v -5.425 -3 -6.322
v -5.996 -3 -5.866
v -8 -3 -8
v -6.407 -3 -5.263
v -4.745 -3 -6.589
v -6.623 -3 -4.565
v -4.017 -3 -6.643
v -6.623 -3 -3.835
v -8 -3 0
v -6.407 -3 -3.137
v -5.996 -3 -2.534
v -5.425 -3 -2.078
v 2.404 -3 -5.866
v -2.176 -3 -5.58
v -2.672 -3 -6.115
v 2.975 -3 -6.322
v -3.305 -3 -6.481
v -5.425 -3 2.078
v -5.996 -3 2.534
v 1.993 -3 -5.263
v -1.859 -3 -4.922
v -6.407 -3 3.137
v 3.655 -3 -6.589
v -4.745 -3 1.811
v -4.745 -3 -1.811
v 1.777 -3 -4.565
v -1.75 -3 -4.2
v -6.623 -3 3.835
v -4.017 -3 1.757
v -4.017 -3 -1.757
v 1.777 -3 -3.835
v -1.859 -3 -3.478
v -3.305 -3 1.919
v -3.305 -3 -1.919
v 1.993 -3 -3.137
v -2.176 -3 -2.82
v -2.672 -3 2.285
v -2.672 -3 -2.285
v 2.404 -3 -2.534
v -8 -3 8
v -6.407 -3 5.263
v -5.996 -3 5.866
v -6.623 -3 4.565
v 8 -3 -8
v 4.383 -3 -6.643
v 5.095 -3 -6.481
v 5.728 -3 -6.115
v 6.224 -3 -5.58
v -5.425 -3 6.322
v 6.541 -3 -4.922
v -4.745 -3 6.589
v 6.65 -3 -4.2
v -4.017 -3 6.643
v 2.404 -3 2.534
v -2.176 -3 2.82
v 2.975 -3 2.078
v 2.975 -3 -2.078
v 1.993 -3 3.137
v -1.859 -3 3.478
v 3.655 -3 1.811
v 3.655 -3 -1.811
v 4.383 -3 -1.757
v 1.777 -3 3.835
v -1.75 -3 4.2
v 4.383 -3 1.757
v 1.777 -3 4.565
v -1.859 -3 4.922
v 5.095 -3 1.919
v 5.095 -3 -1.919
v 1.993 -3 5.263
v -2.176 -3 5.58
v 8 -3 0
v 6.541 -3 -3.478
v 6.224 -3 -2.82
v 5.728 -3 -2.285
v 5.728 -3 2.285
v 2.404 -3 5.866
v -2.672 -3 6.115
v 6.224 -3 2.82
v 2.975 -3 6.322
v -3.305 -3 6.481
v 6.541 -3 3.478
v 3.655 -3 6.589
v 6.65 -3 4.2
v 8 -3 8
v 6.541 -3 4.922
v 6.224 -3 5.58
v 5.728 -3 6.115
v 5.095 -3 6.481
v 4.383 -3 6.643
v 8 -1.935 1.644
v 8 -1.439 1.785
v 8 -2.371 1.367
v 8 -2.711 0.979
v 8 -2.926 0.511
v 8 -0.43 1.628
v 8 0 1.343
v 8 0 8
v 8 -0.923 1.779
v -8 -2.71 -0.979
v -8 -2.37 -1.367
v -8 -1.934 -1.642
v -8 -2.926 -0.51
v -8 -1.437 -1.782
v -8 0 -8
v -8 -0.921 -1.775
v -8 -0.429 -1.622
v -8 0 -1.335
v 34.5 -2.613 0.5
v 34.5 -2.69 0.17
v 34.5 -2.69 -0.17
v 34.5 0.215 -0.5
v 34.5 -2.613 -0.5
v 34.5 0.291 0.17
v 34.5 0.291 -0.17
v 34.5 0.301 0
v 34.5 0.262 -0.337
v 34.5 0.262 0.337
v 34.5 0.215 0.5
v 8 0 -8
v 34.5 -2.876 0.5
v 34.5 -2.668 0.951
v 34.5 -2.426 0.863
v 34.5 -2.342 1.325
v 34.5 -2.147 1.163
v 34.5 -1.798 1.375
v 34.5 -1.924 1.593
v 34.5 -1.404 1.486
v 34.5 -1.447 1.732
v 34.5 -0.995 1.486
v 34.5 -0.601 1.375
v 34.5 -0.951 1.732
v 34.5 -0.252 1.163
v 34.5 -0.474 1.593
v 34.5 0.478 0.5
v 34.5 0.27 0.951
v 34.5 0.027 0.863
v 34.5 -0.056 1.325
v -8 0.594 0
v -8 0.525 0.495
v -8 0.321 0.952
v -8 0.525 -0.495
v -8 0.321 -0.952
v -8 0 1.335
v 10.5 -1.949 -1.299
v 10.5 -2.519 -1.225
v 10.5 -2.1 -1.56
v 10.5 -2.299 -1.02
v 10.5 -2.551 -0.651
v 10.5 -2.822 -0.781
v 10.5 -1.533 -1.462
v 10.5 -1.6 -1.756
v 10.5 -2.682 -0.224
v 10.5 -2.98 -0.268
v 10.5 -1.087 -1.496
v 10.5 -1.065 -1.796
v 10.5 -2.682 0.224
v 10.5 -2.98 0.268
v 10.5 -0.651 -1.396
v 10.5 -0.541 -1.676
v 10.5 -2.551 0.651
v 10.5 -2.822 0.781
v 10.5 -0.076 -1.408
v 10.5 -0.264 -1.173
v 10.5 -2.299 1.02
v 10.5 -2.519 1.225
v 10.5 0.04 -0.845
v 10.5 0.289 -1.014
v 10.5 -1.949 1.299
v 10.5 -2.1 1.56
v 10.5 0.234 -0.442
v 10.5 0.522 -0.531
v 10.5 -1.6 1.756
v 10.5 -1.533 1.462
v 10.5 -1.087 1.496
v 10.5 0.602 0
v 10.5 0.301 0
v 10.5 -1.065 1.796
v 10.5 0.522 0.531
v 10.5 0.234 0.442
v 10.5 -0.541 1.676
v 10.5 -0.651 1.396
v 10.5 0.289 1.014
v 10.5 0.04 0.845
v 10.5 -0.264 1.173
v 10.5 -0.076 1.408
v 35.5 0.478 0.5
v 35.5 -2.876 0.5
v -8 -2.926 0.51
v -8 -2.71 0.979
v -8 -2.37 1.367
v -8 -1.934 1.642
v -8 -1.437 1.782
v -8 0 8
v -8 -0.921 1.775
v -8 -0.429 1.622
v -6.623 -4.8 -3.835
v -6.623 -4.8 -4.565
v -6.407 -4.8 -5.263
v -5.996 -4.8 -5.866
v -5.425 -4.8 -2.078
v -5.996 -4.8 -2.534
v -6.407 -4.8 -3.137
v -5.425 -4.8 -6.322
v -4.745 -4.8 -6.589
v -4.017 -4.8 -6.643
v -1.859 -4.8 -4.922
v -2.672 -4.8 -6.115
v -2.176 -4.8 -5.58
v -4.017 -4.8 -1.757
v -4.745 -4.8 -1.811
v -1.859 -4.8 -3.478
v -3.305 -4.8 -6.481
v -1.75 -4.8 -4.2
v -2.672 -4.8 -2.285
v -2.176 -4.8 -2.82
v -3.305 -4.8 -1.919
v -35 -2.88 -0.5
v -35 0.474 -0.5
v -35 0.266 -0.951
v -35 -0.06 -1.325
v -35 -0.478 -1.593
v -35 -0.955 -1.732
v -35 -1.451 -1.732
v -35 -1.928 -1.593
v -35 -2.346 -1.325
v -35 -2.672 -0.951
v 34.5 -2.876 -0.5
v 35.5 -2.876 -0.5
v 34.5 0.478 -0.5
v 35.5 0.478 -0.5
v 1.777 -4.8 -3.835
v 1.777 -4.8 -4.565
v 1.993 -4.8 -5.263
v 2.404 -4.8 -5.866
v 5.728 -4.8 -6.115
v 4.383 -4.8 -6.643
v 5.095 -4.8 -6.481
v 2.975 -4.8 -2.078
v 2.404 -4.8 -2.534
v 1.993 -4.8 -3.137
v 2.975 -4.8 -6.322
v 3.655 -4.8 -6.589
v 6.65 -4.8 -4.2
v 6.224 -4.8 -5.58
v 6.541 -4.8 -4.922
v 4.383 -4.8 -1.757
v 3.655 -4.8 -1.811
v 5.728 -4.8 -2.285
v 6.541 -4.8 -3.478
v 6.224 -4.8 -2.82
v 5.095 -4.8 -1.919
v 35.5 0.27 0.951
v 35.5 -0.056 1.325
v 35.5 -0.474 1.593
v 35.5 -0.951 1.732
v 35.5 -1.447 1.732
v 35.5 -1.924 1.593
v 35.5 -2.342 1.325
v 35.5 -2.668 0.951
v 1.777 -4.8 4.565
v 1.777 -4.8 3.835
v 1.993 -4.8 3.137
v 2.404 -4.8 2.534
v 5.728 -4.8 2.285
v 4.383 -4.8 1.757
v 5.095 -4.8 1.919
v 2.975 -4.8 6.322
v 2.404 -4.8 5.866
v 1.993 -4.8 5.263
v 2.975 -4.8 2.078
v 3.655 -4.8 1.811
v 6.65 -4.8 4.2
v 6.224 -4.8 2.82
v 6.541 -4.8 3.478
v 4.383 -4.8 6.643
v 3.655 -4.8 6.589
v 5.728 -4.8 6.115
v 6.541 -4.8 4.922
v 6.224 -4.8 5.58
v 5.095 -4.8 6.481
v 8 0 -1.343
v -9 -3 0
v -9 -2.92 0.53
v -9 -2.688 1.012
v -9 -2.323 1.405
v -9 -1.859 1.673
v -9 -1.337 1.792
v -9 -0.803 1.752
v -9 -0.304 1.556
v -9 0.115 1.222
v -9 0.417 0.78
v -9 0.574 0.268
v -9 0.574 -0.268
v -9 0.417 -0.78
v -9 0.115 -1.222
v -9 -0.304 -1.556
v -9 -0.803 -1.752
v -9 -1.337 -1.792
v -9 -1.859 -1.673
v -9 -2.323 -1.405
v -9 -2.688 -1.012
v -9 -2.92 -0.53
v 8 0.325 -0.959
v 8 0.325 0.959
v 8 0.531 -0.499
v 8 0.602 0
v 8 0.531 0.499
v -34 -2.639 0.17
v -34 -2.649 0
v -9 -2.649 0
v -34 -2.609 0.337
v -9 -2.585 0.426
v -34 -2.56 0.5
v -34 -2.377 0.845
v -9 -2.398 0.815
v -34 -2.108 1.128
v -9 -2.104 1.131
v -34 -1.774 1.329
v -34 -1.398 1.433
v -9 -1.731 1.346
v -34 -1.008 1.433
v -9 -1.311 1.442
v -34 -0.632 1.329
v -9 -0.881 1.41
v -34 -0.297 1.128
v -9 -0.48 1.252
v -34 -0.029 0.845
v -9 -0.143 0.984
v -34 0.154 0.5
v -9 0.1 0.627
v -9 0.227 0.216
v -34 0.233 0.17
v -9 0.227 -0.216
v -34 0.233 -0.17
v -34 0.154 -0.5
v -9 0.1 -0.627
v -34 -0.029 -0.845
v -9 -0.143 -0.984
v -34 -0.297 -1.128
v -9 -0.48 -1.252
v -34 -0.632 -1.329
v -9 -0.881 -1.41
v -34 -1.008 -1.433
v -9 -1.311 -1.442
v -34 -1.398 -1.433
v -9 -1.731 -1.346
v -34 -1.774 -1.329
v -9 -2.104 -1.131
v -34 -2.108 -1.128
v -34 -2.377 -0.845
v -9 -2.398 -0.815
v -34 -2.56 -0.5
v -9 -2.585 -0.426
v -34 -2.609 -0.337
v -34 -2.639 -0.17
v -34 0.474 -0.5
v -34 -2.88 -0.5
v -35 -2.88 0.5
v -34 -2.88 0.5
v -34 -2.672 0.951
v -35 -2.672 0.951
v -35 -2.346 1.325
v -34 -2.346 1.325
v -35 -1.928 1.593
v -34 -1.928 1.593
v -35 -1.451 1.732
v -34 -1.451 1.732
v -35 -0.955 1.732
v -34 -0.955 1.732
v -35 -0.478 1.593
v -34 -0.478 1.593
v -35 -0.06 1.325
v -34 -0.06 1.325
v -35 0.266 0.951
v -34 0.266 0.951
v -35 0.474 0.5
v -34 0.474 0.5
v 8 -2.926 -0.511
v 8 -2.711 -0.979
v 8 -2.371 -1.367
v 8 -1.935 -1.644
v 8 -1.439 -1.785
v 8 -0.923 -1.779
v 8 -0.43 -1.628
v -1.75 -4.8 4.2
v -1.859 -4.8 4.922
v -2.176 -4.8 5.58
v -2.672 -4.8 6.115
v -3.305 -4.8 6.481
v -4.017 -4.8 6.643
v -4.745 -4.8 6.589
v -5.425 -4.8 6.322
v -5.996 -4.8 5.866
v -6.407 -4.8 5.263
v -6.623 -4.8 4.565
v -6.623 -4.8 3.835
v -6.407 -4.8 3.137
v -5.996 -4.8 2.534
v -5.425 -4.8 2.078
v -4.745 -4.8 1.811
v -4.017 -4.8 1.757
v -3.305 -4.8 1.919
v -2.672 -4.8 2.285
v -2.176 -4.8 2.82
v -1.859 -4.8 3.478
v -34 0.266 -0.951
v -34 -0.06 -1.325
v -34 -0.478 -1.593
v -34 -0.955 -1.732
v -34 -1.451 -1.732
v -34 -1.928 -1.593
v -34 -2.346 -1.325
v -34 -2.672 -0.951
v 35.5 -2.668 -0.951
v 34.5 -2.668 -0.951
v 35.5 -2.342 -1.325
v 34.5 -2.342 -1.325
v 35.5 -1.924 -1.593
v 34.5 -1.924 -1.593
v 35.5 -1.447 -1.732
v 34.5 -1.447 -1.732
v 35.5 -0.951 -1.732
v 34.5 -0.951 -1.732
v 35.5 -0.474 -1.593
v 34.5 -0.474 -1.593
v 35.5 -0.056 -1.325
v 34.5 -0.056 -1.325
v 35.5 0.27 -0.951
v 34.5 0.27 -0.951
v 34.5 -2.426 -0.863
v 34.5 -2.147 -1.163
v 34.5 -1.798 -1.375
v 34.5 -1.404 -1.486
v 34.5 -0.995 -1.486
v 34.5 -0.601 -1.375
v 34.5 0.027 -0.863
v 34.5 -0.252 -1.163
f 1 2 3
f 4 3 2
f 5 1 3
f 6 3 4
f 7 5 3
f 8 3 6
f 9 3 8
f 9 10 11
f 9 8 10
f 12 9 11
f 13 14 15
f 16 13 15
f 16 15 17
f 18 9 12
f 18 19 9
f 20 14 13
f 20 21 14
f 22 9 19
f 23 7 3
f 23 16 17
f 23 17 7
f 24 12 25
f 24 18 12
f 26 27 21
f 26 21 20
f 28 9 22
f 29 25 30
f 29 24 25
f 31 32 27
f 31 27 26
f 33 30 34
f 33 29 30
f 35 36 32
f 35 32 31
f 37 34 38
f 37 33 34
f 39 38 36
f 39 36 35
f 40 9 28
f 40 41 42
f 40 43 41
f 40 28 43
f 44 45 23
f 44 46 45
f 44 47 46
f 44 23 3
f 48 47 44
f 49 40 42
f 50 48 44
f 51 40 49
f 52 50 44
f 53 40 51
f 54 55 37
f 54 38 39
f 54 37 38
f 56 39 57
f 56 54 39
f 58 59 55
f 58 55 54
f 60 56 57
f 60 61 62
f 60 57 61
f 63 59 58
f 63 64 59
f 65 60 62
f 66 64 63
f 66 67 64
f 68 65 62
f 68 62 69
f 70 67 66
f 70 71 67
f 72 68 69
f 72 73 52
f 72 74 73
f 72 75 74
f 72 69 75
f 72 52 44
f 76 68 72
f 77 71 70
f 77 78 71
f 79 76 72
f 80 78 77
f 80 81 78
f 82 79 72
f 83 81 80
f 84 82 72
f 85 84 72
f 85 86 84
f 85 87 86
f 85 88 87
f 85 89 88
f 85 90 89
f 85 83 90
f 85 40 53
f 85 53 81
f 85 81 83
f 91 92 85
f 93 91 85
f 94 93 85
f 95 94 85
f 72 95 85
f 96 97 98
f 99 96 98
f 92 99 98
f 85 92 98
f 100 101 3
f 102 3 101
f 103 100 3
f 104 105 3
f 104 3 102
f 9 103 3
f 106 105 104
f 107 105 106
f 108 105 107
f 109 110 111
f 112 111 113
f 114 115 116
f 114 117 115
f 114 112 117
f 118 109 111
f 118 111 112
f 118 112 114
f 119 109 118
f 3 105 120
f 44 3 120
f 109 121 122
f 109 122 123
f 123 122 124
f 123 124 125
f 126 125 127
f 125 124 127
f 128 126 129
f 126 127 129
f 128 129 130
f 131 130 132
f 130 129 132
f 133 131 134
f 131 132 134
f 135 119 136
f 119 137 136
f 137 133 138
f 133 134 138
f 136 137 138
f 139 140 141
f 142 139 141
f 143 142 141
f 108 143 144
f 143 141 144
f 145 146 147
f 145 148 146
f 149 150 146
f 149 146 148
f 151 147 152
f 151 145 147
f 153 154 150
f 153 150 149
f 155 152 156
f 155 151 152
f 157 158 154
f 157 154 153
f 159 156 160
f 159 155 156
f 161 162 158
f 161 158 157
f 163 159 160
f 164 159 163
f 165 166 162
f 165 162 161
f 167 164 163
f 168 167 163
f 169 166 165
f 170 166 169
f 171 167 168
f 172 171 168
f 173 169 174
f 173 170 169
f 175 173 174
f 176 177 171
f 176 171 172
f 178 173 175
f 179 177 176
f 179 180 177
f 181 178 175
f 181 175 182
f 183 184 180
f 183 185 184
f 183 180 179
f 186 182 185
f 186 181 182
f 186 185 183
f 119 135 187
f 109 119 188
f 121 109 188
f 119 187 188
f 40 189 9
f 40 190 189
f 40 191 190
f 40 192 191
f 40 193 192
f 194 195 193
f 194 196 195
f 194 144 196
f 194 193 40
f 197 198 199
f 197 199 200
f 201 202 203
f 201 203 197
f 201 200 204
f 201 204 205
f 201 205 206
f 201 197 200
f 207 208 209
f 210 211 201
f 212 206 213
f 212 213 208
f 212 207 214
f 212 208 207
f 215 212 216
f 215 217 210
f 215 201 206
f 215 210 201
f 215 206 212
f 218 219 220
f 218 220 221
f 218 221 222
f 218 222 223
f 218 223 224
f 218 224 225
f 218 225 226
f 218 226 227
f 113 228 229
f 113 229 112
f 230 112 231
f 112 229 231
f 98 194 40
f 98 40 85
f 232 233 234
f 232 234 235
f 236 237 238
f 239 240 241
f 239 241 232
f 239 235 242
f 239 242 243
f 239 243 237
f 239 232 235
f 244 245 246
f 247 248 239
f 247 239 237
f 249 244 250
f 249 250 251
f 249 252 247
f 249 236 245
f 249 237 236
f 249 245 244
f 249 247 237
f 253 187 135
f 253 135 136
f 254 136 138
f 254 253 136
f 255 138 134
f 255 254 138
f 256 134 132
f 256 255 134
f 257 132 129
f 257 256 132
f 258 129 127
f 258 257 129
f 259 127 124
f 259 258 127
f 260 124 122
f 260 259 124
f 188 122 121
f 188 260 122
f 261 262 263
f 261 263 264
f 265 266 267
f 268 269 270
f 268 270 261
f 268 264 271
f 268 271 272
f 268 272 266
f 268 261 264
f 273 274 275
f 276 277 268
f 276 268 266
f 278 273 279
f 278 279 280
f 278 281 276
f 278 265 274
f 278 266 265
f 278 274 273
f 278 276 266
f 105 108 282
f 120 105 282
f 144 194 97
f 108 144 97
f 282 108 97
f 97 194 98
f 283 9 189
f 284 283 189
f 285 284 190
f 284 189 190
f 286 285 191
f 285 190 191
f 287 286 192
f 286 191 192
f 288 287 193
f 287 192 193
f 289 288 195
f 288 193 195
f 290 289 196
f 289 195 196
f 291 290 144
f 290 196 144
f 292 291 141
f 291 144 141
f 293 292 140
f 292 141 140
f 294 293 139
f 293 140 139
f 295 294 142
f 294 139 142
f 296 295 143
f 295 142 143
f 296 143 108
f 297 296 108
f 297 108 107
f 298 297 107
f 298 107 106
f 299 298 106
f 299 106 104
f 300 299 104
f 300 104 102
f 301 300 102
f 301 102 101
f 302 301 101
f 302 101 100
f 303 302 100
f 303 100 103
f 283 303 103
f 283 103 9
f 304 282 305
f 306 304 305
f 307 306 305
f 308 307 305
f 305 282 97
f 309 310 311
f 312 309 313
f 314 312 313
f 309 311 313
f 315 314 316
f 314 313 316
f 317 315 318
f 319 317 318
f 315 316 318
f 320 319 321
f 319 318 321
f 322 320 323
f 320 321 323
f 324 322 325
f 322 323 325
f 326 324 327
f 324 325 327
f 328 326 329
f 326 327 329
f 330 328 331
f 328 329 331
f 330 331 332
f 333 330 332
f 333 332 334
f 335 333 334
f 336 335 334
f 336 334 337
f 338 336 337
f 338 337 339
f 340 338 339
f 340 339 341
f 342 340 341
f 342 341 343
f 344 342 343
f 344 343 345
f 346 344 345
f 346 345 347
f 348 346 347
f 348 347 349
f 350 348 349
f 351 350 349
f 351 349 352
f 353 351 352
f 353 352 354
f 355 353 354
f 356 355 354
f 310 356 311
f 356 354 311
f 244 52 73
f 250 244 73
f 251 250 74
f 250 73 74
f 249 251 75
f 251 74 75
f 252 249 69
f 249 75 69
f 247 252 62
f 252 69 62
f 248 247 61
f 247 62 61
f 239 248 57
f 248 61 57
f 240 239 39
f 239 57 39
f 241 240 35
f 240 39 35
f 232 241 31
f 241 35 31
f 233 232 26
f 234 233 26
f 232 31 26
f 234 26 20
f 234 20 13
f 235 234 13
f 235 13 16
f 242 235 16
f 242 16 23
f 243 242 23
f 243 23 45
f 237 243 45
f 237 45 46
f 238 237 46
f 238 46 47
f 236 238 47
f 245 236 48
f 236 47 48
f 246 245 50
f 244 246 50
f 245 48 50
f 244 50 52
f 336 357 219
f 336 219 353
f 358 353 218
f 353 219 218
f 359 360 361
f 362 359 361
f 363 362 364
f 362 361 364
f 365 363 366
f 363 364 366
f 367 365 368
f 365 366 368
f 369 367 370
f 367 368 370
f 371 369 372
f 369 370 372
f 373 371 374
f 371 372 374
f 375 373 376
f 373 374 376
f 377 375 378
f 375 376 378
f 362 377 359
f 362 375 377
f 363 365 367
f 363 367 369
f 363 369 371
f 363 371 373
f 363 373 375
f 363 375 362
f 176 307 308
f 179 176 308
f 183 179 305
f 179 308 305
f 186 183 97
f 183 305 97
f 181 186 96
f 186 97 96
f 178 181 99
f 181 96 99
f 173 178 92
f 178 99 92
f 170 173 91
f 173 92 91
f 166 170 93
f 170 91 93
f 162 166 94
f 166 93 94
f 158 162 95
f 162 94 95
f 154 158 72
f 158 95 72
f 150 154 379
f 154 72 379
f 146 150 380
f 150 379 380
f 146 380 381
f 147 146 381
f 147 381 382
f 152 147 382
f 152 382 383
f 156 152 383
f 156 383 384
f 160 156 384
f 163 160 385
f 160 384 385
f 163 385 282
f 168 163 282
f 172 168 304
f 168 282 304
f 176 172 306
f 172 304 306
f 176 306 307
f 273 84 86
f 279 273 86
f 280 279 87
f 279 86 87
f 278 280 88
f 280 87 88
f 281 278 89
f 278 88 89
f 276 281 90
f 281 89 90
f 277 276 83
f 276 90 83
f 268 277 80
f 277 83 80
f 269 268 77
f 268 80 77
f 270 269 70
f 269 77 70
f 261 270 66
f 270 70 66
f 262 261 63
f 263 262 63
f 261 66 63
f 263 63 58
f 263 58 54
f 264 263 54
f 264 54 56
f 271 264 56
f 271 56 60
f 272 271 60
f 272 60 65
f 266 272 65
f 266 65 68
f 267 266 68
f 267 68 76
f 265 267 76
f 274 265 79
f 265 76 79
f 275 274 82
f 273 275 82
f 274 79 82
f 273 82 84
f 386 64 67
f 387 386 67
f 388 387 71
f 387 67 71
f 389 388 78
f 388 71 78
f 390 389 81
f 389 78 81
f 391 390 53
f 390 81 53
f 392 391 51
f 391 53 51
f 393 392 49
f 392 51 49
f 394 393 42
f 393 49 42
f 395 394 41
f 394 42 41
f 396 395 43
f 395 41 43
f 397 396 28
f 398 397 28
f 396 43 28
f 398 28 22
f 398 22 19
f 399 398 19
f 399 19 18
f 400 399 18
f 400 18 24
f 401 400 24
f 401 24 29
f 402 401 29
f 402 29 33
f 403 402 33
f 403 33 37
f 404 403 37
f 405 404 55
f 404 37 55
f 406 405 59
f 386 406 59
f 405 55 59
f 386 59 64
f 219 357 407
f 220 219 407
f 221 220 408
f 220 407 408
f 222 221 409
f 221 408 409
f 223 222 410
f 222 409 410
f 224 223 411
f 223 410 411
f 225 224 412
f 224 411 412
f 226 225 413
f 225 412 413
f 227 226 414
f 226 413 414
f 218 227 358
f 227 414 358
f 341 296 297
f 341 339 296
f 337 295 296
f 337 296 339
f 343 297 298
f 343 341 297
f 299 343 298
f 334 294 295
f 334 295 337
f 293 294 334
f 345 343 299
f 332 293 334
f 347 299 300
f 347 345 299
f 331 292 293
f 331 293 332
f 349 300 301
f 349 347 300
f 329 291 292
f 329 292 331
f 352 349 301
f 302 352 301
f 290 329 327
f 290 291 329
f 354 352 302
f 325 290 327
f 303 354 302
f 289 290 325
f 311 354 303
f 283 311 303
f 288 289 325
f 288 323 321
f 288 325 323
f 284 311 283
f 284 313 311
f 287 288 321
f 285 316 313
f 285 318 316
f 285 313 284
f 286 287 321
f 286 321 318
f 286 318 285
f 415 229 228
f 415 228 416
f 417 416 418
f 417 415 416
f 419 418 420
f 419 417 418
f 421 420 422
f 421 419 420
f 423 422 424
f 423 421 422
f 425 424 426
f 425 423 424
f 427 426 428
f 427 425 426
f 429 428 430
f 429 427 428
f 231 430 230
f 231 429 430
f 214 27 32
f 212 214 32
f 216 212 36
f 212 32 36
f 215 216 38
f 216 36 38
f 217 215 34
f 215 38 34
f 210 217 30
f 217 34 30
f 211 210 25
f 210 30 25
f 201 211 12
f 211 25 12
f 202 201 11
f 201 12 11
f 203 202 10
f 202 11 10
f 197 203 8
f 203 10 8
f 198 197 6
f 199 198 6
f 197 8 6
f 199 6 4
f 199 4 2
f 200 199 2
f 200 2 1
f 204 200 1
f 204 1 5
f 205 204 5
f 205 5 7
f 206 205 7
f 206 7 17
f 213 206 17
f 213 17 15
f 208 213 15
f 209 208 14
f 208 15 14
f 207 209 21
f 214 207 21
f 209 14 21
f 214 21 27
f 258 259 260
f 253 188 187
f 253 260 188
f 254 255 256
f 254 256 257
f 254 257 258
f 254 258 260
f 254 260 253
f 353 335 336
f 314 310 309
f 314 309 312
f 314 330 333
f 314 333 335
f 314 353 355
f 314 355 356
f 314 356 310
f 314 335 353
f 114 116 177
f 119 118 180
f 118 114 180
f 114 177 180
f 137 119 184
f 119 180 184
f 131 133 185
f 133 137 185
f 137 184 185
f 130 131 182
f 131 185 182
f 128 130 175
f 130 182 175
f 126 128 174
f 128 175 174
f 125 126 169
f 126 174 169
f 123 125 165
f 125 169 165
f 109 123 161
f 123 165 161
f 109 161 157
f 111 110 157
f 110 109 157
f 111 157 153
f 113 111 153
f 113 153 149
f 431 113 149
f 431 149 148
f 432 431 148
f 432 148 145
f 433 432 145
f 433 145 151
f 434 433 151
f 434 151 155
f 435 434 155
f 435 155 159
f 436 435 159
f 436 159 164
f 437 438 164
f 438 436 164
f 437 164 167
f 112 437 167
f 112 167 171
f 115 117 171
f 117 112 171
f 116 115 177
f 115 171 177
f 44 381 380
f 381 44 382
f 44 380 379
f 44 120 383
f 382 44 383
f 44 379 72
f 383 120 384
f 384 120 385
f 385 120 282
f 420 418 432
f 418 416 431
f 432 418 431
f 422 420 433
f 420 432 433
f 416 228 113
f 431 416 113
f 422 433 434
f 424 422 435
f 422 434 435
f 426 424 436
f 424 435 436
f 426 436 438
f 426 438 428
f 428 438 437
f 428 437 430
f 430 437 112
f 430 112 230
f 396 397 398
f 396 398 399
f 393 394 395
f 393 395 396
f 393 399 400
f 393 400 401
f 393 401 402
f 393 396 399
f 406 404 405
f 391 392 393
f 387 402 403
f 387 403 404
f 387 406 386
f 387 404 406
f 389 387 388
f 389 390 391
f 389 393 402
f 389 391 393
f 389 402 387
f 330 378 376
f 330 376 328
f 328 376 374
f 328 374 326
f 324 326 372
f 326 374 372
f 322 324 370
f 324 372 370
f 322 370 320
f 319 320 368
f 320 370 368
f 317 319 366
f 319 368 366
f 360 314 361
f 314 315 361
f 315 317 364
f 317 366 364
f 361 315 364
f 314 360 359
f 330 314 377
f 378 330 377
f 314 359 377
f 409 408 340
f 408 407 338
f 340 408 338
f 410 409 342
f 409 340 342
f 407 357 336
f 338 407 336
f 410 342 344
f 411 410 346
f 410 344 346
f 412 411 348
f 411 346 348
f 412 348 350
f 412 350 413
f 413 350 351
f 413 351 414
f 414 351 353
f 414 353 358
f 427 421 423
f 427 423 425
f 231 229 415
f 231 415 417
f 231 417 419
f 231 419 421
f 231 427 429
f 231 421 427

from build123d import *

# Parameters (mm, degrees)
F0_W      = 16
F0_H      = 16
F1_DEPTH  = 3
F2_R      = 2.45
F3_DEPTH  = 1.8
F4_R      = 1.800771
F5_DEPTH  = 2.5
F6_R      = 1.5
F7_DEPTH  = 25
F8_R      = 1.75
F9_DEPTH  = 1
F11_DEPTH = 1
F13_DEPTH = 1
F14_R     = 1.446207
F15_DEPTH = 25
F16_R     = 1.75
F17_DEPTH = 1
F19_DEPTH = 1


with BuildPart() as f1:
    # F0 (on Front) → F1 (new body)
    with BuildSketch(Plane.XZ):
        Rectangle(F0_W, F0_H)
    extrude(amount=F1_DEPTH)

    # F2 (on face) → F3 (join)
    with BuildSketch(Plane.XZ.offset(3)):
        with Locations((-4.2, 4.2)):
            Circle(F2_R)
        with Locations((4.2, 4.2)):
            Circle(F2_R)
        with Locations((-4.2, -4.2)):
            Circle(F2_R)
        with Locations((4.2, -4.2)):
            Circle(F2_R)
    extrude(amount=F3_DEPTH)

    # F4 (on face) → F5 (join)
    with BuildSketch(Plane.YZ.offset(8)):
        with Locations((-1.199229, 0)):
            Circle(F4_R)
    extrude(amount=F5_DEPTH)

    # F6 (on face) → F7 (join)
    with BuildSketch(Plane.YZ.offset(10.5)):
        with Locations((-1.199229, 0)):
            Circle(F6_R)
    extrude(amount=F7_DEPTH)

    # F8 (on face) → F9 (join)
    with BuildSketch(Plane.YZ.offset(35.5)):
        with Locations((-1.199229, 0)):
            Circle(F8_R)
    extrude(amount=-F9_DEPTH)

    # F10 (on face) → F11 (cut)
    with BuildSketch(Plane.YZ.offset(35.5)):
        with BuildLine():
            Line((0.477822, 0.5), (-2.87628, 0.5))
            ThreePointArc((-2.87628, 0.5), (-2.949229, 0), (-2.87628, -0.5))
            Line((-2.87628, -0.5), (0.477822, -0.5))
            ThreePointArc((0.477822, -0.5), (0.532437, -0.252647), (0.550771, 0))
            ThreePointArc((0.550771, 0), (0.532437, 0.252647), (0.477822, 0.5))
        make_face()
    extrude(amount=-F11_DEPTH, mode=Mode.SUBTRACT)

    # F12 (on face) → F13 (join)
    with BuildSketch(Plane(origin=(-8, 0, 0), x_dir=(0, -1, 0), z_dir=(-1, 0, 0))):
        with BuildLine():
            ThreePointArc((-0.59449, 0), (1.202755, -1.797245), (3, 0))
            Line((3, 0), (-0.59449, 0))
        make_face()
        with BuildLine():
            Line((-0.59449, 0), (3, 0))
            ThreePointArc((3, 0), (1.202755, 1.797245), (-0.59449, 0))
        make_face()
    extrude(amount=F13_DEPTH)

    # F14 (on face) → F15 (join)
    with BuildSketch(Plane(origin=(-9, 0, 0), x_dir=(0, -1, 0), z_dir=(-1, 0, 0))):
        with Locations((1.202755, 0)):
            Circle(F14_R)
    extrude(amount=F15_DEPTH)

    # F16 (on face) → F17 (join)
    with BuildSketch(Plane(origin=(-34, 0, 0), x_dir=(0, -1, 0), z_dir=(-1, 0, 0))):
        with Locations((1.202755, 0)):
            Circle(F16_R)
    extrude(amount=F17_DEPTH)

    # F18 (on face) → F19 (cut)
    with BuildSketch(Plane(origin=(-35, 0, 0), x_dir=(0, -1, 0), z_dir=(-1, 0, 0))):
        with BuildLine():
            Line((2.879806, 0.5), (-0.474296, 0.5))
            ThreePointArc((-0.474296, 0.5), (-0.547245, 0), (-0.474296, -0.5))
            Line((-0.474296, -0.5), (2.879806, -0.5))
            ThreePointArc((2.879806, -0.5), (2.934422, -0.252647), (2.952755, 0))
            ThreePointArc((2.952755, 0), (2.934422, 0.252647), (2.879806, 0.5))
        make_face()
    extrude(amount=-F19_DEPTH, mode=Mode.SUBTRACT)


solid = f1.part
